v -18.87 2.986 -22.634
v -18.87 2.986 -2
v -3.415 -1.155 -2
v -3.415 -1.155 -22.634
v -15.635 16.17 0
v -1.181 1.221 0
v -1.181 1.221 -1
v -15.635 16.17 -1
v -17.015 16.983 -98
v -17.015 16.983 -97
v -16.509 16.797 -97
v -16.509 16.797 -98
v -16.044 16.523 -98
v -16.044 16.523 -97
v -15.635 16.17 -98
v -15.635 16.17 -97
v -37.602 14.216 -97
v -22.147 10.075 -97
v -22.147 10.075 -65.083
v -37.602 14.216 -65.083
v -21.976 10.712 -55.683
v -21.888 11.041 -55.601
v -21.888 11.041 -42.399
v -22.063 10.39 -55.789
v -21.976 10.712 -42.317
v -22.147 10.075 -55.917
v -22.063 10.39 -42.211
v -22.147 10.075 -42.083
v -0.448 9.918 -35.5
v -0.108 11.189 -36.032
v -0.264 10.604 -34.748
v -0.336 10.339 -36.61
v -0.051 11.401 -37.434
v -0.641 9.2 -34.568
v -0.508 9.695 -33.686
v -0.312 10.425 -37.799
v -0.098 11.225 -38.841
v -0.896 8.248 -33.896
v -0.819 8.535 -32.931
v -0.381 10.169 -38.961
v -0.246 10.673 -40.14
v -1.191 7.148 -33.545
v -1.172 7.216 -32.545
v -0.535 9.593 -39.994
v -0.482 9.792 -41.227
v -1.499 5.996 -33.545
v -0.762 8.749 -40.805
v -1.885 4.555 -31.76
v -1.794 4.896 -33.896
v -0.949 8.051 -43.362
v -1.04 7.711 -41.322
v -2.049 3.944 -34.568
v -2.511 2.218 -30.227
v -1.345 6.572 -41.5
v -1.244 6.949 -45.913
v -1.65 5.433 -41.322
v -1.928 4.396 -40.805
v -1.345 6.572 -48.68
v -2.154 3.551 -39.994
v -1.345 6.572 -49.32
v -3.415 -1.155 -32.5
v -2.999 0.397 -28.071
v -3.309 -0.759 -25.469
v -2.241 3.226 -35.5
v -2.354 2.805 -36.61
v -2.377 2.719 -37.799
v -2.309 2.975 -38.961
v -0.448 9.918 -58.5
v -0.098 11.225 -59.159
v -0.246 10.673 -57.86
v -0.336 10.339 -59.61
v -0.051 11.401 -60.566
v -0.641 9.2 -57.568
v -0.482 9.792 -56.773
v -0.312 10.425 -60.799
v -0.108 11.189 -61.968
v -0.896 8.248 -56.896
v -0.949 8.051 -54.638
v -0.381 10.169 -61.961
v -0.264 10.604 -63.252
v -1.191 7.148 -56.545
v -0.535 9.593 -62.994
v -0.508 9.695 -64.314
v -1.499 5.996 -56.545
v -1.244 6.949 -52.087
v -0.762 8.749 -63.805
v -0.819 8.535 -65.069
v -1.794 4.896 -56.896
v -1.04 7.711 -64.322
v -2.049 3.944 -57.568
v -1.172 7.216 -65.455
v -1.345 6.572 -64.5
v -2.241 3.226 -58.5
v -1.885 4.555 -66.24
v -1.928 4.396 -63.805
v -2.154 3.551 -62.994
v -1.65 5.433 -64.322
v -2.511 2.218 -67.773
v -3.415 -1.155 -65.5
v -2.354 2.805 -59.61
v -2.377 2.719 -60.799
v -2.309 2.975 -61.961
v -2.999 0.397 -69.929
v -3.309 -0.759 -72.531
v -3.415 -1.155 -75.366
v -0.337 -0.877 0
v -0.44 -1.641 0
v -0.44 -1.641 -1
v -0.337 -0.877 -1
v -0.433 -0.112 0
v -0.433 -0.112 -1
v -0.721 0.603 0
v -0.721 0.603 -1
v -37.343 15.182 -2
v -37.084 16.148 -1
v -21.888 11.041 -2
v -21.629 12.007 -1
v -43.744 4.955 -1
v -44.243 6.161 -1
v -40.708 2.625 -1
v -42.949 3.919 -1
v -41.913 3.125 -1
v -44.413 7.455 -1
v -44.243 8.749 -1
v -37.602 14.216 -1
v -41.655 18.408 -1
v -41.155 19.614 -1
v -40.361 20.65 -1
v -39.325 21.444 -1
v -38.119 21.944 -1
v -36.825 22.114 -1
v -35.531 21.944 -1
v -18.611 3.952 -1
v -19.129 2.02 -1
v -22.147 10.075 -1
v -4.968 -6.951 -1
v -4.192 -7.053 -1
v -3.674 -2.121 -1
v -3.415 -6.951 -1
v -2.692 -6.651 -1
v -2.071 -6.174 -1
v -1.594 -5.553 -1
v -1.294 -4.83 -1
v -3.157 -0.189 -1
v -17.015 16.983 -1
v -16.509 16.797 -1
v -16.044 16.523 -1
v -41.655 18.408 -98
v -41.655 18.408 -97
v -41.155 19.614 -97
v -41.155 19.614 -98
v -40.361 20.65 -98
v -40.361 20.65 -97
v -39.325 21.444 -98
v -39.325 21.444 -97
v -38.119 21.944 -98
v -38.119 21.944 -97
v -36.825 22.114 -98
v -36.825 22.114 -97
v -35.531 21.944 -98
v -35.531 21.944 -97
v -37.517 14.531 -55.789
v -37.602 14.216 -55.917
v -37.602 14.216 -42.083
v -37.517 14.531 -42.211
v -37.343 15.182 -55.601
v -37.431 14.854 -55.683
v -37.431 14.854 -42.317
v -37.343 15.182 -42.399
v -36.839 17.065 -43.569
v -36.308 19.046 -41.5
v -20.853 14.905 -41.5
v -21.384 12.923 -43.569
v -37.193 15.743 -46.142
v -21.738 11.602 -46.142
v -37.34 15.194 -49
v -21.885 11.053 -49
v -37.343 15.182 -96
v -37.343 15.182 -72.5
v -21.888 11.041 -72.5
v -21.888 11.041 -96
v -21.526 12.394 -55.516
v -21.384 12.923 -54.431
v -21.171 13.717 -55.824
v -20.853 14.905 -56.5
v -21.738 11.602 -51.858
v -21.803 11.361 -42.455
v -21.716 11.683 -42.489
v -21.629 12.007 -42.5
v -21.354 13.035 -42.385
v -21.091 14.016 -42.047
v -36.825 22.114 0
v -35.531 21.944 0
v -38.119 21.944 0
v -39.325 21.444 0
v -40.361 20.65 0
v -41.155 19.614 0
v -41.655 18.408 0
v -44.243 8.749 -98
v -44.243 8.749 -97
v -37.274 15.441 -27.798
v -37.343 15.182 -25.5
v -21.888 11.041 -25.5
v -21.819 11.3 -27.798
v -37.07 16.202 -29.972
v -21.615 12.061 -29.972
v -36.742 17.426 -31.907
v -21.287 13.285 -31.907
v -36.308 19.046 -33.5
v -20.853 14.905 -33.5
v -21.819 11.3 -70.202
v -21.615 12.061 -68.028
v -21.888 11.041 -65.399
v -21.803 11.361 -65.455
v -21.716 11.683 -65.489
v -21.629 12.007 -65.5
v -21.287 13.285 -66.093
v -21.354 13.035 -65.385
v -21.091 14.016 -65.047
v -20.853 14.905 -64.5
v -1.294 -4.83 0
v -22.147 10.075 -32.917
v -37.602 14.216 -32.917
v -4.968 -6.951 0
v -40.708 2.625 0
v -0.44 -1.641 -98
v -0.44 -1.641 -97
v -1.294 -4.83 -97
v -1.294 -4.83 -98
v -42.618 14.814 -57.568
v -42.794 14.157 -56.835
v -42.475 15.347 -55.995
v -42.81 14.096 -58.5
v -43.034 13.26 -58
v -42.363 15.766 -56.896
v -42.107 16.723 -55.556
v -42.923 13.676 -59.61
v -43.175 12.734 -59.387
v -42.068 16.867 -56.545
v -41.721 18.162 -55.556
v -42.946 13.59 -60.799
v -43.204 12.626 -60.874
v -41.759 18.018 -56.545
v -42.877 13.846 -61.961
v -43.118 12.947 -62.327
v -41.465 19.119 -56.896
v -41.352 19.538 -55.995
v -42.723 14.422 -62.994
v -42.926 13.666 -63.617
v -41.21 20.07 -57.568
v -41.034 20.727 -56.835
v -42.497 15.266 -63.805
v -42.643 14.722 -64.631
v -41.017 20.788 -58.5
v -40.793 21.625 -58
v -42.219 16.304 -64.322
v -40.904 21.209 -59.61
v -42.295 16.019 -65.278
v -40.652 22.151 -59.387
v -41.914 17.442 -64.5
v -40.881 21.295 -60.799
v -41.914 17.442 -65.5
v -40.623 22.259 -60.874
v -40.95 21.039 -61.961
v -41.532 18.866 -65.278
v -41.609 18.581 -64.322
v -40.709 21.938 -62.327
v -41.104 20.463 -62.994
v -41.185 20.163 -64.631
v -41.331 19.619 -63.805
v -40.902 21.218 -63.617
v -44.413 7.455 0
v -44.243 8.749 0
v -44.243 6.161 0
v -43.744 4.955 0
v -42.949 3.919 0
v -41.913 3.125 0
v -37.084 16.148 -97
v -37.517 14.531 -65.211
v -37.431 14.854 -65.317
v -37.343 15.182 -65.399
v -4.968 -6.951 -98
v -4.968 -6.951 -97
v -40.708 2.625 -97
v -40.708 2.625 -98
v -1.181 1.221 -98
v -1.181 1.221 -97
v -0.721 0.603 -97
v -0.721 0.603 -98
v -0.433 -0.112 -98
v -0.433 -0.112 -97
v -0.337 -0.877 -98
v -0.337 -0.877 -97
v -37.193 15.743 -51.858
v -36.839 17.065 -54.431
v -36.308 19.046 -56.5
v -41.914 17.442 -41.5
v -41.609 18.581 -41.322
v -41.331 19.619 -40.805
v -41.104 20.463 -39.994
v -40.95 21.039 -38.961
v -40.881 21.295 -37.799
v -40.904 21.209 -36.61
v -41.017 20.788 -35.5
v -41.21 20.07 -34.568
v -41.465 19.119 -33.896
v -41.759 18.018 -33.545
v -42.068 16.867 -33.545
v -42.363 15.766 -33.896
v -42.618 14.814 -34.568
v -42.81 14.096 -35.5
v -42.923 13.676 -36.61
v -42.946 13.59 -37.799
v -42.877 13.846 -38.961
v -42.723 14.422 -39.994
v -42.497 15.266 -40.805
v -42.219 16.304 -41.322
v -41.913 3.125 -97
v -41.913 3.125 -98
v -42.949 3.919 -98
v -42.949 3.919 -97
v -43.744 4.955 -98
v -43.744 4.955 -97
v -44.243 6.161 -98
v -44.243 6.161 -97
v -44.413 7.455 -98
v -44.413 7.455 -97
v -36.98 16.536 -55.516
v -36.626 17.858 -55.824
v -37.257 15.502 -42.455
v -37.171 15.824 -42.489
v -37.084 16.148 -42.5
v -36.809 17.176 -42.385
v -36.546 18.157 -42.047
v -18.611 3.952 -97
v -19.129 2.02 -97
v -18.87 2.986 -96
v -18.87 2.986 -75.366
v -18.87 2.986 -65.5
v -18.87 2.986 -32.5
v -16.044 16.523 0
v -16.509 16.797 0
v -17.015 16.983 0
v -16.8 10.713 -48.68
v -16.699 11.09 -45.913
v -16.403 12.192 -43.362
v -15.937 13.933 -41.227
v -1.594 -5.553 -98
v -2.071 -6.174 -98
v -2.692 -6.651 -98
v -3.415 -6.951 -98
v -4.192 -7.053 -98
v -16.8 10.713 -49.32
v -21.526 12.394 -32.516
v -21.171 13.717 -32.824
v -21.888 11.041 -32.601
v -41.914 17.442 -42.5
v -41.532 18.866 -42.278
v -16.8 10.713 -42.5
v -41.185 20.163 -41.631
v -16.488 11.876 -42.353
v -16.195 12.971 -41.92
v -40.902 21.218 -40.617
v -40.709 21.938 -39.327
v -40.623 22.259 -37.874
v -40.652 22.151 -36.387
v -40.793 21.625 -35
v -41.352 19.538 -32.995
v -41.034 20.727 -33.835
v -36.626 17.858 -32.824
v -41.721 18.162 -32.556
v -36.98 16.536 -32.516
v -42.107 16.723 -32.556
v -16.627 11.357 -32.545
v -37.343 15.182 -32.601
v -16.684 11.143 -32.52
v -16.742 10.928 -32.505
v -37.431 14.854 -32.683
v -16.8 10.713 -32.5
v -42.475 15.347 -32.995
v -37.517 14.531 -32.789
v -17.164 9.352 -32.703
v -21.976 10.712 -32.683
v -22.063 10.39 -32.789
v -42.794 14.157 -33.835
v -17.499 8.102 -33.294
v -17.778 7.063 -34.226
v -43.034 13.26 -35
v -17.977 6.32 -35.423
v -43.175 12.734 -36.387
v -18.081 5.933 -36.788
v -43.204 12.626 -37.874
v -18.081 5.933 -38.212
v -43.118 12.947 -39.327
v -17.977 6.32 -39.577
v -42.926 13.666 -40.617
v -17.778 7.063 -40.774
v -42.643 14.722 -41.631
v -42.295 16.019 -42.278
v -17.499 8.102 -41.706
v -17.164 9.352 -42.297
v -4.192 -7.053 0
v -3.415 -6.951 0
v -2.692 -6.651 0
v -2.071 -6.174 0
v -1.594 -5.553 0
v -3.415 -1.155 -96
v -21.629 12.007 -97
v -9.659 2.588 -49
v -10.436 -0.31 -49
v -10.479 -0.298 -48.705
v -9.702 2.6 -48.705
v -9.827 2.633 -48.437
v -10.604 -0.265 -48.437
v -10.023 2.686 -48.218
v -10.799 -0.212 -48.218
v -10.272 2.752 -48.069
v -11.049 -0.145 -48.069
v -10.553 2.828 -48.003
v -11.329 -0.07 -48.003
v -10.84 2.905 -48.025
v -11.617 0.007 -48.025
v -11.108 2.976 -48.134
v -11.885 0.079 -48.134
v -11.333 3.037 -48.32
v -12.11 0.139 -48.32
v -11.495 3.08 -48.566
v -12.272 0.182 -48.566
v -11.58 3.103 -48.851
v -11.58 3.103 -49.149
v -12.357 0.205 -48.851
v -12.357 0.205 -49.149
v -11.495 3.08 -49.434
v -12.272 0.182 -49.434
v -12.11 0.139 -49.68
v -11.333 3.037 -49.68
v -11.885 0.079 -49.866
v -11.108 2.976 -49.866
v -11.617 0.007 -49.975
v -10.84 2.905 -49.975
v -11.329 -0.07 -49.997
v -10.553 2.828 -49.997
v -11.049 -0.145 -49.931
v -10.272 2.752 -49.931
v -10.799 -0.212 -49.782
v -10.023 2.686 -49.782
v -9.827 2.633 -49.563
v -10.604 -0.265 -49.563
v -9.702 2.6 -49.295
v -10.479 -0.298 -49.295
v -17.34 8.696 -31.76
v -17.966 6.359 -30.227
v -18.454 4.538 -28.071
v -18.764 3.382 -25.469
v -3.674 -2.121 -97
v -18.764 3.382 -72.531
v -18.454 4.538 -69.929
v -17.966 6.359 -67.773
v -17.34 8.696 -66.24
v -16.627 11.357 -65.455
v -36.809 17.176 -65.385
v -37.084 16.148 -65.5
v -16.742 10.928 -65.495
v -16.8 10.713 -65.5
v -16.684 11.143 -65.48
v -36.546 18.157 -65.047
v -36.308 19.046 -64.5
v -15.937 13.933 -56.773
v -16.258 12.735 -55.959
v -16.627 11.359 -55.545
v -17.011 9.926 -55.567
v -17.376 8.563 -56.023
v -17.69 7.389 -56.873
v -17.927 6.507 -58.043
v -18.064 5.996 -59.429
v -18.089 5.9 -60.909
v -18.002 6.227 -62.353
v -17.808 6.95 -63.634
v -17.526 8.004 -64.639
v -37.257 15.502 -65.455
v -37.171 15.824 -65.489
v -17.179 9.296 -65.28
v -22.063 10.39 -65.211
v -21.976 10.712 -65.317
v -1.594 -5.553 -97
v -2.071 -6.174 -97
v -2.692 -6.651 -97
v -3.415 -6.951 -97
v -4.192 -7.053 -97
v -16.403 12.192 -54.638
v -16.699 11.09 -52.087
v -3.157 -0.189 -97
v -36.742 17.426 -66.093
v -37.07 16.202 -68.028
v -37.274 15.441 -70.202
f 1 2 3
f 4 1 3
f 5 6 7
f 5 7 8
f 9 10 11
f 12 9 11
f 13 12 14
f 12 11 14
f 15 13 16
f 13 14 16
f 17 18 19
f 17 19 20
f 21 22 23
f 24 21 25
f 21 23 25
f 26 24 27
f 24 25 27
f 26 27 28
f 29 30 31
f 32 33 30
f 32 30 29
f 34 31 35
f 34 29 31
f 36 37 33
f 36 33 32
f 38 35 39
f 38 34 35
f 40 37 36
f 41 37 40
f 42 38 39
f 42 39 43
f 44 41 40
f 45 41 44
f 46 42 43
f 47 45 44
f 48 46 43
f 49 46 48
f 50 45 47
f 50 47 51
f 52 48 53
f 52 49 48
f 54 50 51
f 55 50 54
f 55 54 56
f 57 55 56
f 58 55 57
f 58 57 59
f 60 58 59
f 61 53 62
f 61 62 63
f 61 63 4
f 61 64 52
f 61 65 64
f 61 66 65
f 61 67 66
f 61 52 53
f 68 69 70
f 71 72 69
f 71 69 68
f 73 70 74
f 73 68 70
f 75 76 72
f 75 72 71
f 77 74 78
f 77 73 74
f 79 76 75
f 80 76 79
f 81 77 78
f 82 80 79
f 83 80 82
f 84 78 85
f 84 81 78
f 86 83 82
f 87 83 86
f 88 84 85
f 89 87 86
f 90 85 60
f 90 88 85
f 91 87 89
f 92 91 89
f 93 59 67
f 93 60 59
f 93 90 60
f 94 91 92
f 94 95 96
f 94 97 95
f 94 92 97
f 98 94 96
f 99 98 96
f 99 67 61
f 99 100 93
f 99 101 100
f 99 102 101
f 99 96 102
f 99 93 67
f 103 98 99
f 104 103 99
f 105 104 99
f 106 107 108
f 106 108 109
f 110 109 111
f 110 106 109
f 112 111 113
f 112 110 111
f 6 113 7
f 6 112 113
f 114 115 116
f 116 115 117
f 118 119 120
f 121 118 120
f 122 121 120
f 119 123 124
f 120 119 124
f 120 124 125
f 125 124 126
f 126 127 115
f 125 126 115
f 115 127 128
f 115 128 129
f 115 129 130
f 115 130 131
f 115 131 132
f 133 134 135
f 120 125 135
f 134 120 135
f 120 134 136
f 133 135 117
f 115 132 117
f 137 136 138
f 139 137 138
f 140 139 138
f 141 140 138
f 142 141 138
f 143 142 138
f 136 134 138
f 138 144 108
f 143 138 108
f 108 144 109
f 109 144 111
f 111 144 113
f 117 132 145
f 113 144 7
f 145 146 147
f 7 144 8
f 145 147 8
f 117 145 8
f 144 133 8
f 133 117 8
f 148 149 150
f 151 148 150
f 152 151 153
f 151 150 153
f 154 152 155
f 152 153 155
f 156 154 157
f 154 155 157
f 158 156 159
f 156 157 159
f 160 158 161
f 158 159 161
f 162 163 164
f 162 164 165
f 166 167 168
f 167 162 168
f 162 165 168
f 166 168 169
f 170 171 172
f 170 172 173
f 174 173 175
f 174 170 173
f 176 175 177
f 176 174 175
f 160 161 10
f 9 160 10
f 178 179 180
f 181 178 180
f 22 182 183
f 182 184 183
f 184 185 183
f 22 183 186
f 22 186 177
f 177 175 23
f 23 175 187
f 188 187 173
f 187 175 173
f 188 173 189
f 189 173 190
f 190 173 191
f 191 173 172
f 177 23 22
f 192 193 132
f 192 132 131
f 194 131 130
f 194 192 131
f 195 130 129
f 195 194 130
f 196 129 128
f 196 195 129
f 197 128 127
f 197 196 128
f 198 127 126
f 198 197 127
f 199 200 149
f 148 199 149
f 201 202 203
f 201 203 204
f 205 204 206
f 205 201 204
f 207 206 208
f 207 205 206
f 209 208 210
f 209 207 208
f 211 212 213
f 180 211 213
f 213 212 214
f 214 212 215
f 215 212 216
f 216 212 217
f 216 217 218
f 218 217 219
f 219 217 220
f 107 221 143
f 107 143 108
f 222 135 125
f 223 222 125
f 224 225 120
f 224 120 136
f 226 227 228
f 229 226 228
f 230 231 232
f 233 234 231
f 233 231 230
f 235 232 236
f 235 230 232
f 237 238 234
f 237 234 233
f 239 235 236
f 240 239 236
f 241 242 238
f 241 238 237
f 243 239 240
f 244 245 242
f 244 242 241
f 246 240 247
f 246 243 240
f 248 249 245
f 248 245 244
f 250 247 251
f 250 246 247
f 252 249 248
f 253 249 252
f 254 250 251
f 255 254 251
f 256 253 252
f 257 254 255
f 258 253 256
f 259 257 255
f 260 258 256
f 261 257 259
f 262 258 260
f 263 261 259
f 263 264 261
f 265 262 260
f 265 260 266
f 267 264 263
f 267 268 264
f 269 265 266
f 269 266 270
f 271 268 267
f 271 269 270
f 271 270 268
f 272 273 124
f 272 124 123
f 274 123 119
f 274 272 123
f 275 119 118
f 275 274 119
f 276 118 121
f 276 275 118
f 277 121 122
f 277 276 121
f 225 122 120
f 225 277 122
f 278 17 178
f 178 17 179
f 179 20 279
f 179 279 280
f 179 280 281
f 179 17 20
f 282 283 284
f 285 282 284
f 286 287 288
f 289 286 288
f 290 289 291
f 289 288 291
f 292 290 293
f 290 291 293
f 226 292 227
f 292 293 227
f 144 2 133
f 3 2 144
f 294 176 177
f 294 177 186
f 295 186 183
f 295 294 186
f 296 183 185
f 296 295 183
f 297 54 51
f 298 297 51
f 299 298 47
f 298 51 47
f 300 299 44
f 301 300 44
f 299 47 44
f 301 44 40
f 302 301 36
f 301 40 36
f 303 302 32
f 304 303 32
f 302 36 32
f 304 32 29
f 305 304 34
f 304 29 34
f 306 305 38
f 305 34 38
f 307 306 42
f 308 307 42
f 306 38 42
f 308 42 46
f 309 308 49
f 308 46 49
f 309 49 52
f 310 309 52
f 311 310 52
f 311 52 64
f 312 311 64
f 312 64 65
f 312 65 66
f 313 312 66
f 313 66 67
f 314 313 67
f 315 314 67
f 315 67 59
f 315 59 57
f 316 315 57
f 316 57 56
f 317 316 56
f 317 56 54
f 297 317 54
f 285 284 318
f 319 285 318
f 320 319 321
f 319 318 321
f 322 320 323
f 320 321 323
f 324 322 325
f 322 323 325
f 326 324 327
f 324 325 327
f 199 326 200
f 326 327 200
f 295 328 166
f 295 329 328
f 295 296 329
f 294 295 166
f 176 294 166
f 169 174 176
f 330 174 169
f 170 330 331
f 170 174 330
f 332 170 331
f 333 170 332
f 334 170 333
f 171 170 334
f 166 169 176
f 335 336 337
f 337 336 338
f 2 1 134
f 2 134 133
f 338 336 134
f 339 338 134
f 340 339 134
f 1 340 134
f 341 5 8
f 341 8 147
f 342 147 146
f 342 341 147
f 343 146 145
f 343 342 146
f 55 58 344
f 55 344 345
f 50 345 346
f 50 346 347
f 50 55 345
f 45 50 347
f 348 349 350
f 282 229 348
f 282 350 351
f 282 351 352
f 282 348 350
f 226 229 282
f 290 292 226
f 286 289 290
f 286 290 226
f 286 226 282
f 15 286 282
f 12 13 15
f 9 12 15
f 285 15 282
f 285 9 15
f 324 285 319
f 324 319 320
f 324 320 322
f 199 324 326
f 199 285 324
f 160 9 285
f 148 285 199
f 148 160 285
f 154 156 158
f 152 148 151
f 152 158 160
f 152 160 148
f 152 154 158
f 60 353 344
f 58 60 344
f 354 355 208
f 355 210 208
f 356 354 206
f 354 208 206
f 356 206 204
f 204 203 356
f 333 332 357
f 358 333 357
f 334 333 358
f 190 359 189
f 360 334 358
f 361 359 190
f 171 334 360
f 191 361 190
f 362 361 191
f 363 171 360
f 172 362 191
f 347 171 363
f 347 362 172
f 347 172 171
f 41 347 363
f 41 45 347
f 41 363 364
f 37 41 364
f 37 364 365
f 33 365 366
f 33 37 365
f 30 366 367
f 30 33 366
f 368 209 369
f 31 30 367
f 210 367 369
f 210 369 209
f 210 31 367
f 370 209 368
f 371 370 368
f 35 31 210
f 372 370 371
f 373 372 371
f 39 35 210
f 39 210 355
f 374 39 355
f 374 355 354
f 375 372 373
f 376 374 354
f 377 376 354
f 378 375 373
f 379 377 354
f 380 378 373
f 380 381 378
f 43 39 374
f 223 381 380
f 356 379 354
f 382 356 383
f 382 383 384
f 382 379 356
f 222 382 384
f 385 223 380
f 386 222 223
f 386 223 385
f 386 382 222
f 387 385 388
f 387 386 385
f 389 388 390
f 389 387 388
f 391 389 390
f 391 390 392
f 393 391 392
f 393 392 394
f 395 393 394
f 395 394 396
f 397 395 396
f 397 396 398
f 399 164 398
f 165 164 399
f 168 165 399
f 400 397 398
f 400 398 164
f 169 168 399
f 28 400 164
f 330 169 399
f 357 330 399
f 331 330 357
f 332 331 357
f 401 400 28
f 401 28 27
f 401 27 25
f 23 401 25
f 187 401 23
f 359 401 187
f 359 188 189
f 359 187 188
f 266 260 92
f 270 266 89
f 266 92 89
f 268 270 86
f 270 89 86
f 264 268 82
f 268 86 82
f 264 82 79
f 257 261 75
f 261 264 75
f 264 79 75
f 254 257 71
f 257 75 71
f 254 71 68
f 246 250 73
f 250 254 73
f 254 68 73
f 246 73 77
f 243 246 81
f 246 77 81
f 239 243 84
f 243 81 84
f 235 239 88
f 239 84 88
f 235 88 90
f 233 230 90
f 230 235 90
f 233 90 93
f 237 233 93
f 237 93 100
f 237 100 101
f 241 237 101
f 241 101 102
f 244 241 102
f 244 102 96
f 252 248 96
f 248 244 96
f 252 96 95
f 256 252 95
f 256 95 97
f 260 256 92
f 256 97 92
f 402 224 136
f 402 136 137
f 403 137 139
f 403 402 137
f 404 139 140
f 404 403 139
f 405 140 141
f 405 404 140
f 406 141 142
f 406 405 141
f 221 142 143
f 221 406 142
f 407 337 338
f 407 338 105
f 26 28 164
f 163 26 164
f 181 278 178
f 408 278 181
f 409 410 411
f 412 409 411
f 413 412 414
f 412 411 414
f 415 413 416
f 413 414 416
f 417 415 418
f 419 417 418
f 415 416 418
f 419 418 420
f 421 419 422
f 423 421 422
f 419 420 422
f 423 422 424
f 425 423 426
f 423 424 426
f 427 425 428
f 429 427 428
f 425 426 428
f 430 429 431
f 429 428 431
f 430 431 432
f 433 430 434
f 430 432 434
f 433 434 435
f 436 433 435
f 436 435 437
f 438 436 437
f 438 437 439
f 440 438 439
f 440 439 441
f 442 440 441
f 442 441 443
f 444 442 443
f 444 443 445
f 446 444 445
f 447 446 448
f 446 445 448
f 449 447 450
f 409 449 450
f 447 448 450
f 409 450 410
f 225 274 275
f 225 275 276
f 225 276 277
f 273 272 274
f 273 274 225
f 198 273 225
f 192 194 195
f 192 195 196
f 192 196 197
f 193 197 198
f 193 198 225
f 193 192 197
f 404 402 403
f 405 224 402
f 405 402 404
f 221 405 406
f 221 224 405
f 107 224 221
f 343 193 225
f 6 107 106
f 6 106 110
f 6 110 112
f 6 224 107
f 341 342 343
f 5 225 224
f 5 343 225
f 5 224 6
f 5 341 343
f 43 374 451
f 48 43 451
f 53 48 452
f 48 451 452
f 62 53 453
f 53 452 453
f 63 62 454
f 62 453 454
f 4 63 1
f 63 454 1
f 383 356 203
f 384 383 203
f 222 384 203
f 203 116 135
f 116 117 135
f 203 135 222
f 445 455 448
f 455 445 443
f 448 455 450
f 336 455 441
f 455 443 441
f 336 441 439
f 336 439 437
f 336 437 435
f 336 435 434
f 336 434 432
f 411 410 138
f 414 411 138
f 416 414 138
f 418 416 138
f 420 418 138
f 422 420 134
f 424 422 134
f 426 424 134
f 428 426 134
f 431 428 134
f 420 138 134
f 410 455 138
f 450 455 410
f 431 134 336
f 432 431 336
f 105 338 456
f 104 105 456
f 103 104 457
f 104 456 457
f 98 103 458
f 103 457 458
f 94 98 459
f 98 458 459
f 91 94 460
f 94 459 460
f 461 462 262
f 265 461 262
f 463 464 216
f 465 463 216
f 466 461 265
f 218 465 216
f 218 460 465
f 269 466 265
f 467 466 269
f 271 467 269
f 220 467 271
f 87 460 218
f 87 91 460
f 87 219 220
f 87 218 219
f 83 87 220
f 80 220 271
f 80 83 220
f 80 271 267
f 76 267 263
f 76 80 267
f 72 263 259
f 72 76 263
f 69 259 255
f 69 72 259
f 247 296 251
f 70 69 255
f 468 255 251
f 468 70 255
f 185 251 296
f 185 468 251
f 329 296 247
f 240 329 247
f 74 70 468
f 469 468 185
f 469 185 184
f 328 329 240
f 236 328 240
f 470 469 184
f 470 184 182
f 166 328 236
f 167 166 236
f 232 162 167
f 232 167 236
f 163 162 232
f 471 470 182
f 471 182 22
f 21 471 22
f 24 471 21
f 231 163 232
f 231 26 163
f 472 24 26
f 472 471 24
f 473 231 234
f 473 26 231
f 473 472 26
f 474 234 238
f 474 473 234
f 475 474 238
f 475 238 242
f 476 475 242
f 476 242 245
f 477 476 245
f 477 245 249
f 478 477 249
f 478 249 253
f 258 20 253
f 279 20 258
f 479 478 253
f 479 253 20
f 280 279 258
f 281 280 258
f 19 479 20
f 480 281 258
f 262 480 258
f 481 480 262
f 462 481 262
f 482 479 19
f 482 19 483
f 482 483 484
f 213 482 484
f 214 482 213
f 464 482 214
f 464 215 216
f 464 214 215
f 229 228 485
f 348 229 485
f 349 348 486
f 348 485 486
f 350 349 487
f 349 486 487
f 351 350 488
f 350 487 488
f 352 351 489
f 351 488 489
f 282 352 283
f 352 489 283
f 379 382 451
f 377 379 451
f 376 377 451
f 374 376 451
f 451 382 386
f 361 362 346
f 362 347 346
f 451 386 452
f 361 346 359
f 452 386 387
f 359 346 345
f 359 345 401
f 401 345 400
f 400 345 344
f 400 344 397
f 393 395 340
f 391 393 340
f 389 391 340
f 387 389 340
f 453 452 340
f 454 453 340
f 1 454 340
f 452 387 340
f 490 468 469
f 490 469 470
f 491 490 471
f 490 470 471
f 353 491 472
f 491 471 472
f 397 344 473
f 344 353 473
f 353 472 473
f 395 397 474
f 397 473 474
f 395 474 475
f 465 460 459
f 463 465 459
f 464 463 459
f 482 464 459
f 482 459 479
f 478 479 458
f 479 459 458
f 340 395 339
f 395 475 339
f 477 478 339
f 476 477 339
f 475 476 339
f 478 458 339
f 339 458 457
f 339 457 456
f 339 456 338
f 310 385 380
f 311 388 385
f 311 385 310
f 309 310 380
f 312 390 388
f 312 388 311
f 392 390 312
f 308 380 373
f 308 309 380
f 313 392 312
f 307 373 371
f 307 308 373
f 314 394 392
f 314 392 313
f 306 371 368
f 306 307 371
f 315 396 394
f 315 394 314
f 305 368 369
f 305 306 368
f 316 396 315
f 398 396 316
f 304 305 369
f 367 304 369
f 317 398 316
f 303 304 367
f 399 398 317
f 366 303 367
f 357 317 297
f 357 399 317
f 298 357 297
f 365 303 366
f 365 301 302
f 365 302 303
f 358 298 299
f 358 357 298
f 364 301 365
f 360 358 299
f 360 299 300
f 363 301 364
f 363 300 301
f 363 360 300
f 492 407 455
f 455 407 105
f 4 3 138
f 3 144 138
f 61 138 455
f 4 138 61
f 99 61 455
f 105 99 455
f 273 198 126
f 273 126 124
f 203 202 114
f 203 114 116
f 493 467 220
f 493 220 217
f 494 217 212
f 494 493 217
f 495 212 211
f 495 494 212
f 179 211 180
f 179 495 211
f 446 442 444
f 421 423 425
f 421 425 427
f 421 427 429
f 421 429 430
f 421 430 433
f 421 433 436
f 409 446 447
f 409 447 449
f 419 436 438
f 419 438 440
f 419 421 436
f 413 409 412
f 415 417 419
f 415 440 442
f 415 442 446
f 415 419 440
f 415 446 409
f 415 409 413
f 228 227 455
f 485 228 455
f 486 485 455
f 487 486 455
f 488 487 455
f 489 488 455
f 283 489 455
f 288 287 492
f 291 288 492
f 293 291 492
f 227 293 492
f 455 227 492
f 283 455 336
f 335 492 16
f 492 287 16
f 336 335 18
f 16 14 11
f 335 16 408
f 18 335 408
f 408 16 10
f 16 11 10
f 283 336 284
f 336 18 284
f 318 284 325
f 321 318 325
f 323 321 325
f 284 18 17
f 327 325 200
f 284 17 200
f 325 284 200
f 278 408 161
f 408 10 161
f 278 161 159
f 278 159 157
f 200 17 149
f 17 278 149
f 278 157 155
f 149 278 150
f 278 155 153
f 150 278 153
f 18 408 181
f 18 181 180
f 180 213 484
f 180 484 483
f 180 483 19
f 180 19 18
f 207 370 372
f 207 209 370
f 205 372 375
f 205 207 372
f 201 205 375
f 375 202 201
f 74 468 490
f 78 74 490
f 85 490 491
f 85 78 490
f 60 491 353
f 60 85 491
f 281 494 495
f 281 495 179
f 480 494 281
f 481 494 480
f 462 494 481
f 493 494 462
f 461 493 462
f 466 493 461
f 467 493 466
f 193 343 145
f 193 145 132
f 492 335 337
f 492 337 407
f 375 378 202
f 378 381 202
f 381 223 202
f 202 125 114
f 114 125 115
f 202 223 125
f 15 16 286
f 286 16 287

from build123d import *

# Parameters (mm, degrees)
BOSS_EXTRUDE1_DEPTH = 1
BOSS_EXTRUDE2_DEPTH = 96
BOSS_EXTRUDE3_DEPTH = 1
BOSS_EXTRUDE4_DEPTH = 16
EXTRUDE_THIN1_REACH = 110.549
CUT_EXTRUDE1_DEPTH  = 102.965680501
CUT_EXTRUDE2_DEPTH  = 102.965680501
FILLET1_START       = -19
FILLET1_DEPTH       = 16
FILLET2_R           = 10
FILLET3_R           = 10
FILLET4_R           = 10
CHAMFER1_SIZE       = 1
CHAMFER2_SIZE       = 1
SKETCH8_R           = 1
CUT_EXTRUDE3_DEPTH  = 3


with BuildPart() as part:
    # Sketch1 → Boss-Extrude1 (new body)
    with BuildSketch(Plane.XY):
        with BuildLine():
            Line((-1.180699325, 1.221103194), (-15.635082302, 16.170119303))
            ThreePointArc((-15.635082302, 16.170119303), (-16.269985561, 16.670148445), (-17.01532588, 16.982556993))
            Line((-17.01532588, 16.982556993), (-35.53120451, 21.94387172))
            ThreePointArc((-35.53120451, 21.94387172), (-39.325299736, 21.444369607), (-41.654928867, 18.408337814))
            Line((-41.654928867, 18.408337814), (-44.243119318, 8.749079551))
            ThreePointArc((-44.243119318, 8.749079551), (-43.743617206, 4.954984325), (-40.707585412, 2.625355194))
            Line((-40.707585412, 2.625355194), (-4.96832984, -6.950949475))
            ThreePointArc((-4.96832984, -6.950949475), (-2.691872704, -6.651248207), (-1.294095226, -4.829629131))
            Line((-1.294095226, -4.829629131), (-0.43962256, -1.640693729))
            ThreePointArc((-0.43962256, -1.640693729), (-0.433194836, -0.11217799), (-1.180699325, 1.221103194))
        make_face()
    extrude(amount=-BOSS_EXTRUDE1_DEPTH)

    # Sketch2 → Boss-Extrude2 (add)
    with BuildSketch(Plane(origin=(0, 0, -1), x_dir=(-1, 0, 0), z_dir=(0, 0, -1))):
        Polygon((3.415415569, -1.155394517), (3.674234614, -2.121320344), (19.129047835, 2.019784378), (18.87022879, 2.985710204), align=None)
        Polygon((21.888124605, 11.041286214), (22.146943651, 10.075360388), (37.601756871, 14.216465109), (37.342937826, 15.182390936), align=None)
    extrude(amount=BOSS_EXTRUDE2_DEPTH)

    # Sketch3 → Boss-Extrude3 (add)
    with BuildSketch(Plane(origin=(0, 0, -97), x_dir=(-1, 0, 0), z_dir=(0, 0, -1))):
        with BuildLine():
            Line((4.96832984, -6.950949475), (40.707585412, 2.625355194))
            ThreePointArc((40.707585412, 2.625355194), (43.743617206, 4.954984325), (44.243119318, 8.749079551))
            Line((44.243119318, 8.749079551), (41.654928867, 18.408337814))
            ThreePointArc((41.654928867, 18.408337814), (39.325299736, 21.444369607), (35.53120451, 21.94387172))
            Line((35.53120451, 21.94387172), (17.01532588, 16.982556993))
            ThreePointArc((17.01532588, 16.982556993), (16.269985561, 16.670148445), (15.635082302, 16.170119303))
            Line((15.635082302, 16.170119303), (1.180699325, 1.221103194))
            ThreePointArc((1.180699325, 1.221103194), (0.433194836, -0.11217799), (0.43962256, -1.640693729))
            Line((0.43962256, -1.640693729), (1.294095226, -4.829629131))
            ThreePointArc((1.294095226, -4.829629131), (2.691872704, -6.651248207), (4.96832984, -6.950949475))
        make_face()
    extrude(amount=BOSS_EXTRUDE3_DEPTH)

    # Sketch4 → Boss-Extrude4 (add)
    with BuildSketch(Plane(origin=(-2.897777479, 0.776457135, 0), x_dir=(0, 0, -1), z_dir=(0.9659258262890703, -0.25881904510251386, 0))):
        with BuildLine():
            Line((49, 6), (49, -2))
            Line((49, -2), (65.5, -2))
            Line((65.5, -2), (65.5, 6))
            ThreePointArc((65.5, 6), (60.5, 1), (55.5, 6))
            Line((55.5, 6), (49, 6))
        make_face()
        with BuildLine():
            Line((32.5, 6), (32.5, -2))
            Line((32.5, -2), (49, -2))
            Line((49, -2), (49, 6))
            Line((49, 6), (42.5, 6))
            ThreePointArc((42.5, 6), (37.5, 1), (32.5, 6))
        make_face()
    extrude(amount=-BOSS_EXTRUDE4_DEPTH)

    # Extrude-Thin1: up to this face of the body (flat: up to its plane)
    extrude_thin1_end = Plane(part.part.faces().sort_by_distance((-42.949024093, 13.578708682, -97.5))[0])
    # Sketch5 → Extrude-Thin1 (add, up to the picked face)
    with BuildSketch(Plane(origin=(-2.897777479, 0.776457135, 0), x_dir=(0, 0, -1), z_dir=(0.9659258262890703, -0.25881904510251386, 0)), mode=Mode.PRIVATE) as extrude_thin1_sk1:
        with BuildLine():
            ThreePointArc((55.5, 6), (60.5, 1), (65.5, 6))
            ThreePointArc((65.5, 6), (60.5, 11), (55.5, 6))
        make_face()
        with BuildLine():
            ThreePointArc((56.5, 6), (60.5, 2), (64.5, 6))
            ThreePointArc((64.5, 6), (60.5, 10), (56.5, 6))
        make_face(mode=Mode.SUBTRACT)
    extrude_thin1_tool1 = split(extrude(extrude_thin1_sk1.sketch, amount=-EXTRUDE_THIN1_REACH, mode=Mode.PRIVATE), bisect_by=extrude_thin1_end, keep=Keep.BOTH, mode=Mode.PRIVATE)
    # Sketch5 → Extrude-Thin1 (add, up to the picked face)
    with BuildSketch(Plane(origin=(-2.897777479, 0.776457135, 0), x_dir=(0, 0, -1), z_dir=(0.9659258262890703, -0.25881904510251386, 0)), mode=Mode.PRIVATE) as extrude_thin1_sk2:
        with BuildLine():
            ThreePointArc((32.5, 6), (37.5, 1), (42.5, 6))
            ThreePointArc((42.5, 6), (37.5, 11), (32.5, 6))
        make_face()
        with BuildLine():
            ThreePointArc((33.5, 6), (37.5, 2), (41.5, 6))
            ThreePointArc((41.5, 6), (37.5, 10), (33.5, 6))
        make_face(mode=Mode.SUBTRACT)
    extrude_thin1_tool2 = split(extrude(extrude_thin1_sk2.sketch, amount=-EXTRUDE_THIN1_REACH, mode=Mode.PRIVATE), bisect_by=extrude_thin1_end, keep=Keep.BOTH, mode=Mode.PRIVATE)
    add(extrude_thin1_tool1.solids().sort_by(Axis((-2.602356, 1.878986, -60.5), (-0.9659258262890703, 0.25881904510251386, 0)))[0])
    add(extrude_thin1_tool2.solids().sort_by(Axis((-2.602356, 1.878986, -37.5), (-0.9659258262890703, 0.25881904510251386, 0)))[0])

    # Sketch6 → Cut-Extrude1 (cut, through all)
    with BuildSketch(Plane(origin=(-23.182219831, 6.211657082, 0), x_dir=(0, 0, -1), z_dir=(0.9659258262890705, -0.2588190451025127, 0))):
        with BuildLine():
            Line((57.035898385, 4), (63.964101615, 4))
            ThreePointArc((63.964101615, 4), (64.202459174, 4.486132084), (64.372983346, 5))
            Line((64.372983346, 5), (56.627016654, 5))
            ThreePointArc((56.627016654, 5), (56.797540826, 4.486132084), (57.035898385, 4))
        make_face()
    extrude(amount=-CUT_EXTRUDE1_DEPTH, mode=Mode.SUBTRACT)

    # Sketch7 → Cut-Extrude2 (cut, through all)
    with BuildSketch(Plane(origin=(-23.182219831, 6.211657082, 0), x_dir=(0, 0, -1), z_dir=(0.9659258262890704, -0.25881904510251263, 0))):
        with BuildLine():
            Line((34.035898385, 4), (40.964101615, 4))
            ThreePointArc((40.964101615, 4), (41.202459174, 4.486132084), (41.372983346, 5))
            Line((41.372983346, 5), (33.627016654, 5))
            ThreePointArc((33.627016654, 5), (33.797540826, 4.486132084), (34.035898385, 4))
        make_face()
    extrude(amount=-CUT_EXTRUDE2_DEPTH, mode=Mode.SUBTRACT)

    # Fillet1: read off the stored shape, not the designer's step
    # Fillet1 outline → Fillet1 (add)
    with BuildSketch(Plane(origin=(0, 0, 0), x_dir=(0.2588190451025141, 0.96592582628907, 0), z_dir=(0.9659258262890701, -0.2588190451025141, 0)).offset(FILLET1_START)):
        with BuildLine():
            ThreePointArc((6.666666667, -32.544643751), (0.472273473, -29.216737139), (-2, -22.633931253))
            Line((-2, -22.633931253), (-2, -32.5))
            Line((-2, -32.5), (6, -32.5))
            ThreePointArc((6, -32.5), (6.334079897, -32.511173422), (6.666666667, -32.544643751))
        make_face()
        with BuildLine():
            ThreePointArc((-2, -75.366068747), (0.472273473, -68.783262861), (6.666666667, -65.455356249))
            ThreePointArc((6.666666667, -65.455356249), (6.334079897, -65.488826578), (6, -65.5))
            Line((6, -65.5), (-2, -65.5))
            Line((-2, -65.5), (-2, -75.366068747))
        make_face()
    extrude(amount=FILLET1_DEPTH)

    # Fillet2
    # the kernel refuses this fillet: 10 mm, written as the material it adds along each edge
    with BuildSketch(Plane(origin=(-37.342937826, 15.182390936, -65.398979486), x_dir=(0, 0, -1), z_dir=(0.9659258262890703, -0.25881904510251386, 0))) as fillet2_piece_1:
        with BuildLine():
            CenterArc((7.101020514, 10), FILLET2_R, 216.869897646, 53.130102354)
            ThreePointArc((-0.898979486, 4), (-0.020664308, 2.096376317), (0, 0))
            Line((0, 0), (7.101020514, 0))
        make_face()
    extrude(amount=16)
    with BuildSketch(Plane(origin=(-37.342937826, 15.182390936, -32.601020514), x_dir=(0.25252017519049164, 0.9424181237471358, -0.21927526343546186), z_dir=(0.9659258262890703, -0.25881904510251386, 0))) as fillet2_piece_2:
        with BuildLine():
            CenterArc((8.199552211, 9.120955865), FILLET2_R, 192.666469307, 53.130102354)
            Line((-1.557078144, 6.92820323), (0, 0))
            ThreePointArc((0, 0), (2.049888053, 0.439522068), (4.099776106, 0))
        make_face()
    extrude(amount=16)

    # Fillet3
    # the kernel refuses this fillet: 10 mm, written as the material it adds along each edge
    with BuildSketch(Plane(origin=(-37.342937826, 15.182390936, -55.601020514), x_dir=(0.252520175190492, 0.9424181237471373, -0.21927526343545575), z_dir=(0.9659258262890703, -0.25881904510251386, 0))) as fillet3_piece_1:
        with BuildLine():
            CenterArc((8.199552211, 9.120955865), FILLET3_R, 192.666469307, 53.130102354)
            Line((-1.557078144, 6.92820323), (0, 0))
            ThreePointArc((0, 0), (2.049888053, 0.439522068), (4.099776106, 0))
        make_face()
    extrude(amount=16)
    with BuildSketch(Plane(origin=(-37.342937826, 15.182390936, -42.398979486), x_dir=(0, 0, -1), z_dir=(0.9659258262890703, -0.25881904510251386, 0))) as fillet3_piece_2:
        with BuildLine():
            CenterArc((7.101020514, 10), FILLET3_R, 216.869897646, 53.130102354)
            ThreePointArc((-0.898979486, 4), (-0.020664308, 2.096376317), (0, 0))
            Line((0, 0), (7.101020514, 0))
        make_face()
    extrude(amount=16)

    # Fillet4
    # the kernel refuses this fillet: 10 mm, written as the material it adds along each edge
    with BuildSketch(Plane(origin=(-1.344863208, 6.572012093, -42.5), x_dir=(0.24178159790789314, 0.9023412077274722, 0.35682208977308716), z_dir=(-0.9659258262890703, 0.25881904510251386, 0))) as fillet4_piece_1:
        with BuildLine():
            CenterArc((7.136441795, 9.34172359), FILLET4_R, 200.905157448, 48.189685104)
            Line((-2.205281794, 5.773502692), (-2.392116266, 5.702138274))
            Line((-2.392116266, 5.702138274), (-0.186834472, -0.071364418))
            Line((-0.186834472, -0.071364418), (0.071364418, -0.186834472))
            ThreePointArc((0.071364418, -0.186834472), (1.784110449, 0.129138205), (3.49685648, -0.186834472))
            Line((3.49685648, -0.186834472), (3.568220898, 0))
        make_face()
    extrude(amount=16)
    with BuildSketch(Plane(origin=(-1.344863208, 6.572012093, -55.5), x_dir=(0.24178159790789344, 0.9023412077274733, -0.3568220897730836), z_dir=(-0.9659258262890703, 0.25881904510251386, 0))) as fillet4_piece_2:
        with BuildLine():
            CenterArc((7.136441795, -9.34172359), FILLET4_R, 110.905157448, 48.189685104)
            Line((-2.205281794, -5.773502692), (-2.392116266, -5.702138274))
            Line((-2.392116266, -5.702138274), (-0.186834472, 0.071364418))
            Line((-0.186834472, 0.071364418), (0.071364418, 0.186834472))
            ThreePointArc((0.071364418, 0.186834472), (1.784110449, -0.129138205), (3.49685648, 0.186834472))
            Line((3.49685648, 0.186834472), (3.568220898, 0))
        make_face()
    extrude(amount=16)

    # Chamfer1
    chamfer1_edges = [part.edges().sort_by_distance(p)[0] for p in [
        (-11.142822179, 0.915157844, -1),
        (-11.142822179, 0.915157844, -97),
    ]]
    chamfer(chamfer1_edges, length=CHAMFER1_SIZE)

    # Chamfer2
    chamfer2_edges = [part.edges().sort_by_distance(p)[0] for p in [
        (-29.615531216, 13.111838575, -1),
        (-29.615531216, 13.111838575, -97),
    ]]
    chamfer(chamfer2_edges, length=CHAMFER2_SIZE)

    # Sketch8 → Cut-Extrude3 (cut)
    with BuildSketch(Plane(origin=(-0.776457135, -2.897777479, 0), x_dir=(0.9659258262890701, -0.25881904510251413, 0), z_dir=(-0.25881904510251413, -0.9659258262890701, 0))):
        with Locations((-11, -49)):
            Circle(SKETCH8_R)
    extrude(amount=-CUT_EXTRUDE3_DEPTH, mode=Mode.SUBTRACT)


solid = part.part
